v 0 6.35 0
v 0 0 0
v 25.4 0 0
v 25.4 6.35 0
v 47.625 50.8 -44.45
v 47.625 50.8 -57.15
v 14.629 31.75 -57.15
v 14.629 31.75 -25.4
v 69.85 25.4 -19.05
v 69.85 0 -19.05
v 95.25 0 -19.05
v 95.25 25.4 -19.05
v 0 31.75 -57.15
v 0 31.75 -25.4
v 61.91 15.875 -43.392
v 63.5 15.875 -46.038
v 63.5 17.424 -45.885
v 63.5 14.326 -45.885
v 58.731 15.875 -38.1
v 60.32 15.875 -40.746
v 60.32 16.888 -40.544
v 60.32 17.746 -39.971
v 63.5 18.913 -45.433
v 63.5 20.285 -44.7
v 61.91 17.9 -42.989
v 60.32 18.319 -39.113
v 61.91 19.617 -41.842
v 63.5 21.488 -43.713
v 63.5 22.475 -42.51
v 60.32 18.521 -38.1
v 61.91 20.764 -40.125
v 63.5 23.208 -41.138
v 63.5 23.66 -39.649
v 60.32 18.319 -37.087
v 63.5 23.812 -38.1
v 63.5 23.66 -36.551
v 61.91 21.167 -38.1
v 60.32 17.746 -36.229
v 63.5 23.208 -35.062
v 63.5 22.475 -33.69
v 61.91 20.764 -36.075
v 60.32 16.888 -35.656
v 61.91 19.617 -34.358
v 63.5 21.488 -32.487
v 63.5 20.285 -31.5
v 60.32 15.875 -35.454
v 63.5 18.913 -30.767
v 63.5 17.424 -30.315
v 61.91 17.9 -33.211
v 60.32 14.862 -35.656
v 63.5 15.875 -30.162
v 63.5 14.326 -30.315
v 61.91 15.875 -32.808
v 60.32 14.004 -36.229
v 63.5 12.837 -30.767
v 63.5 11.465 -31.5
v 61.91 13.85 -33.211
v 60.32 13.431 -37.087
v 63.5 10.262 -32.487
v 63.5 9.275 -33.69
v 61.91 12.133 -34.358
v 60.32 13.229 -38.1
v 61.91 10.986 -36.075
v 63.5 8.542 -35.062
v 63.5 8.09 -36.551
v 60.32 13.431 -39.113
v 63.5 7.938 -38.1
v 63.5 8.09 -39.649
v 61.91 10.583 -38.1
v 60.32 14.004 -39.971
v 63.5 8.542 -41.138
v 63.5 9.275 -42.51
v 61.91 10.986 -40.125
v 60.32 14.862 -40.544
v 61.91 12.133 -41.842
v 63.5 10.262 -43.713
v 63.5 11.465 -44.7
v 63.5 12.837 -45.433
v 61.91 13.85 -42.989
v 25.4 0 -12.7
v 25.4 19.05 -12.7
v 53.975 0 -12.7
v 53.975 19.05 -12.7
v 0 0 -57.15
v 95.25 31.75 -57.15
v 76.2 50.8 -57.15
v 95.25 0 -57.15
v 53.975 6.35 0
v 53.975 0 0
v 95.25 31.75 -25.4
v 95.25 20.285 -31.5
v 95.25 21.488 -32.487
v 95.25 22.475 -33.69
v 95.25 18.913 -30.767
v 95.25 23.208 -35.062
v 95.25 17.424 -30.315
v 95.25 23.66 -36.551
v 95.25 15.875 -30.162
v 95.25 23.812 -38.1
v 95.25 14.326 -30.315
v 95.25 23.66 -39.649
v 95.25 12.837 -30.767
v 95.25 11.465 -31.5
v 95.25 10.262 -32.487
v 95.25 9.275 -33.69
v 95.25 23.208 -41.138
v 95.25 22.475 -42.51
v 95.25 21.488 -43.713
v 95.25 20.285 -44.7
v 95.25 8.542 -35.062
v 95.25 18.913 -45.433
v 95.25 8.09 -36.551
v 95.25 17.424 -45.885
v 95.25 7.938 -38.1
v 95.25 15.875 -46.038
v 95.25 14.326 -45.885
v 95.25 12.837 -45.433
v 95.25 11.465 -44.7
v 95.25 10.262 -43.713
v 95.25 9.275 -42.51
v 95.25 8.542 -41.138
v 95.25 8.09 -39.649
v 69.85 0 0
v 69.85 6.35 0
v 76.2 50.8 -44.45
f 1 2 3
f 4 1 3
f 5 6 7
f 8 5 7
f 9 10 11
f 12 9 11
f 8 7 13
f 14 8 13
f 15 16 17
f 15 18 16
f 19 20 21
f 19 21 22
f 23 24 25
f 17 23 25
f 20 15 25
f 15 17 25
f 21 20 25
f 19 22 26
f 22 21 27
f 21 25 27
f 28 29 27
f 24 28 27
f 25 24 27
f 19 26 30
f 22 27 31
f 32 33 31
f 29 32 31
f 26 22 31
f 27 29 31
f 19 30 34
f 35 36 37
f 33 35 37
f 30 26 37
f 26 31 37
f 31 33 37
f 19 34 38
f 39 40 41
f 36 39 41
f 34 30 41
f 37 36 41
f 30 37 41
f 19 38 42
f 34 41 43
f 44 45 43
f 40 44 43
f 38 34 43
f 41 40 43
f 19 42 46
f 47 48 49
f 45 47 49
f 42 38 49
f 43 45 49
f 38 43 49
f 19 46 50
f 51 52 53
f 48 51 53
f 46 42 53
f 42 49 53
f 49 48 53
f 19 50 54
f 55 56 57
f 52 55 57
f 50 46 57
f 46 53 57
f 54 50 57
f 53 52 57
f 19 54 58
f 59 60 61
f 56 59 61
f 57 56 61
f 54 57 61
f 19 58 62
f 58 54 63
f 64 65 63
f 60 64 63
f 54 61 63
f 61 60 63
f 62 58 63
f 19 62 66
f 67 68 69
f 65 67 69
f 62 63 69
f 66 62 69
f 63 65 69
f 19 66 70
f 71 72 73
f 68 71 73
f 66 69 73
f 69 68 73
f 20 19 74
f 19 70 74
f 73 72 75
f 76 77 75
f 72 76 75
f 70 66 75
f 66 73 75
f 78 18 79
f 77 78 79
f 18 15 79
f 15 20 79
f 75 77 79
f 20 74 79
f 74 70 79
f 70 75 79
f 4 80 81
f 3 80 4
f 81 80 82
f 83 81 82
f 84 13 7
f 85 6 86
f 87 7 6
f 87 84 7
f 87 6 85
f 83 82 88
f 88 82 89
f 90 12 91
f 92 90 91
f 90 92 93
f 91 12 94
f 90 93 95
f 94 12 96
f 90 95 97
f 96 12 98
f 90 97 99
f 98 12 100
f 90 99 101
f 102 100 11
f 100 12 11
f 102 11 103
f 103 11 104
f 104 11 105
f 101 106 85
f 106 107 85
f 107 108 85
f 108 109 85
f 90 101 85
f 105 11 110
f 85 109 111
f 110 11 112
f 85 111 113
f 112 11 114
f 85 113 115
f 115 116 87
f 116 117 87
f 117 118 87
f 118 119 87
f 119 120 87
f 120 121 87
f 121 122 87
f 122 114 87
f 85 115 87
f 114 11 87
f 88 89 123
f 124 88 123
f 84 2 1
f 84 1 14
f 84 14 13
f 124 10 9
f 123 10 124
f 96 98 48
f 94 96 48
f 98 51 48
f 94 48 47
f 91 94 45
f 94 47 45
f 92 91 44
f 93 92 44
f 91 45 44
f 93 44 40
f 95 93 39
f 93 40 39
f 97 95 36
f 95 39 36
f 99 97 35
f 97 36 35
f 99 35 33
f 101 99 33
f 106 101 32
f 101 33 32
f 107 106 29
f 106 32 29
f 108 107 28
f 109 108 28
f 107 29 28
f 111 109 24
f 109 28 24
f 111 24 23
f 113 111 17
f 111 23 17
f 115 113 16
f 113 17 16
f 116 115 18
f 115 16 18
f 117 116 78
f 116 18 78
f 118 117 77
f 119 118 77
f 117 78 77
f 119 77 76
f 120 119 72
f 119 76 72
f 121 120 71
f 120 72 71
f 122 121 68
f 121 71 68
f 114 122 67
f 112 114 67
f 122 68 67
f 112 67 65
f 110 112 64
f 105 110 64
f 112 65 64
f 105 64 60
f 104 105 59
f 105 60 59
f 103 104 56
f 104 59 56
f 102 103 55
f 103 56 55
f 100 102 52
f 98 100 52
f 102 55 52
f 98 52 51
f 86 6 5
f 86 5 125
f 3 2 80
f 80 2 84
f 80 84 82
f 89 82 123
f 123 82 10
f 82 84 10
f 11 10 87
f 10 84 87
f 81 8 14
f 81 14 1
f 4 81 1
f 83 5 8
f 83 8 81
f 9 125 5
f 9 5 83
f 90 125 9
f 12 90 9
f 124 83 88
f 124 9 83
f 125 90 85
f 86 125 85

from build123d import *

# Parameters (mm, degrees)
ESQUISSE1_W                           = 95.25
ESQUISSE1_H                           = 57.15
BASE_EXTRUSION_DEPTH                  = 50.8
ENL_V_MAT_EXTRU_1_DEPTH               = 123.144688792
ESQUISSE3_W                           = 25.4
ESQUISSE3_H                           = 19.05
ESQUISSE3_W_2                         = 28.575
ESQUISSE3_H_2                         = 12.7
ENL_V_MAT_EXTRU_2_DEPTH               = 123.144688792
CHANFREIN1_SIZE                       = 19.05
ENL_V_MAT_EXTRU_3_DEPTH               = 123.144688792
DIAM_TRE_DU_PER_AGE_5_8_0_625_2_D     = 15.875
DIAM_TRE_DU_PER_AGE_5_8_0_625_2_DEPTH = 31.75
DIAM_TRE_DU_PER_AGE_5_8_0_625_2_TIP   = 4.769331164


with BuildPart() as part:
    # Esquisse1 → Base-Extrusion (new body)
    with BuildSketch(Plane(origin=(0, 0, 0), x_dir=(1, 0, 0), z_dir=(0, 1, 0))):
        with Locations((47.625, 28.575)):
            Rectangle(ESQUISSE1_W, ESQUISSE1_H)
    extrude(amount=BASE_EXTRUSION_DEPTH)

    # Esquisse2 → Enlèv. mat.-Extru.1 (cut, through all)
    with BuildSketch(Plane(origin=(95.25, 0, 0), x_dir=(0, 0, -1), z_dir=(1, 0, 0))):
        Polygon((44.45, 50.8), (0, 6.35), (0, 50.8), align=None)
    extrude(amount=-ENL_V_MAT_EXTRU_1_DEPTH, mode=Mode.SUBTRACT)

    # Esquisse3 → Enlèv. mat.-Extru.2 (cut, through all)
    with BuildSketch(Plane.XZ):
        with Locations((82.55, -9.525)):
            Rectangle(ESQUISSE3_W, ESQUISSE3_H)
        with Locations((39.6875, -6.35)):
            Rectangle(ESQUISSE3_W_2, ESQUISSE3_H_2)
    extrude(amount=-ENL_V_MAT_EXTRU_2_DEPTH, mode=Mode.SUBTRACT)

    # Chanfrein1
    chanfrein1_edges = [part.edges().sort_by_distance(p)[0] for p in [
        (95.25, 50.8, -50.8),
    ]]
    chamfer(chanfrein1_edges, length=CHANFREIN1_SIZE)

    # Esquisse4 → Enlèv. mat.-Extru.3 (cut, through all)
    with BuildSketch(Plane(origin=(0, 0, -57.15), x_dir=(-1, 0, 0), z_dir=(0, 0, -1))):
        Polygon((0, 50.8), (-47.625, 50.8), (-14.629432116, 31.75), (0, 31.75), align=None)
    extrude(amount=-ENL_V_MAT_EXTRU_3_DEPTH, mode=Mode.SUBTRACT)

    # Diamètre du perçage 5/8 (0.625)2
    with Locations(Plane(origin=(95.25, 0, 0), x_dir=(0, 0, -1), z_dir=(1, 0, 0))):
        with Locations((38.1, 15.875)):
            Hole(DIAM_TRE_DU_PER_AGE_5_8_0_625_2_D / 2, depth=DIAM_TRE_DU_PER_AGE_5_8_0_625_2_DEPTH)
            with Locations((0, 0, -(DIAM_TRE_DU_PER_AGE_5_8_0_625_2_DEPTH + DIAM_TRE_DU_PER_AGE_5_8_0_625_2_TIP / 2))):  # 118° drill point
                Cone(0, DIAM_TRE_DU_PER_AGE_5_8_0_625_2_D / 2, DIAM_TRE_DU_PER_AGE_5_8_0_625_2_TIP, mode=Mode.SUBTRACT)


solid = part.part
